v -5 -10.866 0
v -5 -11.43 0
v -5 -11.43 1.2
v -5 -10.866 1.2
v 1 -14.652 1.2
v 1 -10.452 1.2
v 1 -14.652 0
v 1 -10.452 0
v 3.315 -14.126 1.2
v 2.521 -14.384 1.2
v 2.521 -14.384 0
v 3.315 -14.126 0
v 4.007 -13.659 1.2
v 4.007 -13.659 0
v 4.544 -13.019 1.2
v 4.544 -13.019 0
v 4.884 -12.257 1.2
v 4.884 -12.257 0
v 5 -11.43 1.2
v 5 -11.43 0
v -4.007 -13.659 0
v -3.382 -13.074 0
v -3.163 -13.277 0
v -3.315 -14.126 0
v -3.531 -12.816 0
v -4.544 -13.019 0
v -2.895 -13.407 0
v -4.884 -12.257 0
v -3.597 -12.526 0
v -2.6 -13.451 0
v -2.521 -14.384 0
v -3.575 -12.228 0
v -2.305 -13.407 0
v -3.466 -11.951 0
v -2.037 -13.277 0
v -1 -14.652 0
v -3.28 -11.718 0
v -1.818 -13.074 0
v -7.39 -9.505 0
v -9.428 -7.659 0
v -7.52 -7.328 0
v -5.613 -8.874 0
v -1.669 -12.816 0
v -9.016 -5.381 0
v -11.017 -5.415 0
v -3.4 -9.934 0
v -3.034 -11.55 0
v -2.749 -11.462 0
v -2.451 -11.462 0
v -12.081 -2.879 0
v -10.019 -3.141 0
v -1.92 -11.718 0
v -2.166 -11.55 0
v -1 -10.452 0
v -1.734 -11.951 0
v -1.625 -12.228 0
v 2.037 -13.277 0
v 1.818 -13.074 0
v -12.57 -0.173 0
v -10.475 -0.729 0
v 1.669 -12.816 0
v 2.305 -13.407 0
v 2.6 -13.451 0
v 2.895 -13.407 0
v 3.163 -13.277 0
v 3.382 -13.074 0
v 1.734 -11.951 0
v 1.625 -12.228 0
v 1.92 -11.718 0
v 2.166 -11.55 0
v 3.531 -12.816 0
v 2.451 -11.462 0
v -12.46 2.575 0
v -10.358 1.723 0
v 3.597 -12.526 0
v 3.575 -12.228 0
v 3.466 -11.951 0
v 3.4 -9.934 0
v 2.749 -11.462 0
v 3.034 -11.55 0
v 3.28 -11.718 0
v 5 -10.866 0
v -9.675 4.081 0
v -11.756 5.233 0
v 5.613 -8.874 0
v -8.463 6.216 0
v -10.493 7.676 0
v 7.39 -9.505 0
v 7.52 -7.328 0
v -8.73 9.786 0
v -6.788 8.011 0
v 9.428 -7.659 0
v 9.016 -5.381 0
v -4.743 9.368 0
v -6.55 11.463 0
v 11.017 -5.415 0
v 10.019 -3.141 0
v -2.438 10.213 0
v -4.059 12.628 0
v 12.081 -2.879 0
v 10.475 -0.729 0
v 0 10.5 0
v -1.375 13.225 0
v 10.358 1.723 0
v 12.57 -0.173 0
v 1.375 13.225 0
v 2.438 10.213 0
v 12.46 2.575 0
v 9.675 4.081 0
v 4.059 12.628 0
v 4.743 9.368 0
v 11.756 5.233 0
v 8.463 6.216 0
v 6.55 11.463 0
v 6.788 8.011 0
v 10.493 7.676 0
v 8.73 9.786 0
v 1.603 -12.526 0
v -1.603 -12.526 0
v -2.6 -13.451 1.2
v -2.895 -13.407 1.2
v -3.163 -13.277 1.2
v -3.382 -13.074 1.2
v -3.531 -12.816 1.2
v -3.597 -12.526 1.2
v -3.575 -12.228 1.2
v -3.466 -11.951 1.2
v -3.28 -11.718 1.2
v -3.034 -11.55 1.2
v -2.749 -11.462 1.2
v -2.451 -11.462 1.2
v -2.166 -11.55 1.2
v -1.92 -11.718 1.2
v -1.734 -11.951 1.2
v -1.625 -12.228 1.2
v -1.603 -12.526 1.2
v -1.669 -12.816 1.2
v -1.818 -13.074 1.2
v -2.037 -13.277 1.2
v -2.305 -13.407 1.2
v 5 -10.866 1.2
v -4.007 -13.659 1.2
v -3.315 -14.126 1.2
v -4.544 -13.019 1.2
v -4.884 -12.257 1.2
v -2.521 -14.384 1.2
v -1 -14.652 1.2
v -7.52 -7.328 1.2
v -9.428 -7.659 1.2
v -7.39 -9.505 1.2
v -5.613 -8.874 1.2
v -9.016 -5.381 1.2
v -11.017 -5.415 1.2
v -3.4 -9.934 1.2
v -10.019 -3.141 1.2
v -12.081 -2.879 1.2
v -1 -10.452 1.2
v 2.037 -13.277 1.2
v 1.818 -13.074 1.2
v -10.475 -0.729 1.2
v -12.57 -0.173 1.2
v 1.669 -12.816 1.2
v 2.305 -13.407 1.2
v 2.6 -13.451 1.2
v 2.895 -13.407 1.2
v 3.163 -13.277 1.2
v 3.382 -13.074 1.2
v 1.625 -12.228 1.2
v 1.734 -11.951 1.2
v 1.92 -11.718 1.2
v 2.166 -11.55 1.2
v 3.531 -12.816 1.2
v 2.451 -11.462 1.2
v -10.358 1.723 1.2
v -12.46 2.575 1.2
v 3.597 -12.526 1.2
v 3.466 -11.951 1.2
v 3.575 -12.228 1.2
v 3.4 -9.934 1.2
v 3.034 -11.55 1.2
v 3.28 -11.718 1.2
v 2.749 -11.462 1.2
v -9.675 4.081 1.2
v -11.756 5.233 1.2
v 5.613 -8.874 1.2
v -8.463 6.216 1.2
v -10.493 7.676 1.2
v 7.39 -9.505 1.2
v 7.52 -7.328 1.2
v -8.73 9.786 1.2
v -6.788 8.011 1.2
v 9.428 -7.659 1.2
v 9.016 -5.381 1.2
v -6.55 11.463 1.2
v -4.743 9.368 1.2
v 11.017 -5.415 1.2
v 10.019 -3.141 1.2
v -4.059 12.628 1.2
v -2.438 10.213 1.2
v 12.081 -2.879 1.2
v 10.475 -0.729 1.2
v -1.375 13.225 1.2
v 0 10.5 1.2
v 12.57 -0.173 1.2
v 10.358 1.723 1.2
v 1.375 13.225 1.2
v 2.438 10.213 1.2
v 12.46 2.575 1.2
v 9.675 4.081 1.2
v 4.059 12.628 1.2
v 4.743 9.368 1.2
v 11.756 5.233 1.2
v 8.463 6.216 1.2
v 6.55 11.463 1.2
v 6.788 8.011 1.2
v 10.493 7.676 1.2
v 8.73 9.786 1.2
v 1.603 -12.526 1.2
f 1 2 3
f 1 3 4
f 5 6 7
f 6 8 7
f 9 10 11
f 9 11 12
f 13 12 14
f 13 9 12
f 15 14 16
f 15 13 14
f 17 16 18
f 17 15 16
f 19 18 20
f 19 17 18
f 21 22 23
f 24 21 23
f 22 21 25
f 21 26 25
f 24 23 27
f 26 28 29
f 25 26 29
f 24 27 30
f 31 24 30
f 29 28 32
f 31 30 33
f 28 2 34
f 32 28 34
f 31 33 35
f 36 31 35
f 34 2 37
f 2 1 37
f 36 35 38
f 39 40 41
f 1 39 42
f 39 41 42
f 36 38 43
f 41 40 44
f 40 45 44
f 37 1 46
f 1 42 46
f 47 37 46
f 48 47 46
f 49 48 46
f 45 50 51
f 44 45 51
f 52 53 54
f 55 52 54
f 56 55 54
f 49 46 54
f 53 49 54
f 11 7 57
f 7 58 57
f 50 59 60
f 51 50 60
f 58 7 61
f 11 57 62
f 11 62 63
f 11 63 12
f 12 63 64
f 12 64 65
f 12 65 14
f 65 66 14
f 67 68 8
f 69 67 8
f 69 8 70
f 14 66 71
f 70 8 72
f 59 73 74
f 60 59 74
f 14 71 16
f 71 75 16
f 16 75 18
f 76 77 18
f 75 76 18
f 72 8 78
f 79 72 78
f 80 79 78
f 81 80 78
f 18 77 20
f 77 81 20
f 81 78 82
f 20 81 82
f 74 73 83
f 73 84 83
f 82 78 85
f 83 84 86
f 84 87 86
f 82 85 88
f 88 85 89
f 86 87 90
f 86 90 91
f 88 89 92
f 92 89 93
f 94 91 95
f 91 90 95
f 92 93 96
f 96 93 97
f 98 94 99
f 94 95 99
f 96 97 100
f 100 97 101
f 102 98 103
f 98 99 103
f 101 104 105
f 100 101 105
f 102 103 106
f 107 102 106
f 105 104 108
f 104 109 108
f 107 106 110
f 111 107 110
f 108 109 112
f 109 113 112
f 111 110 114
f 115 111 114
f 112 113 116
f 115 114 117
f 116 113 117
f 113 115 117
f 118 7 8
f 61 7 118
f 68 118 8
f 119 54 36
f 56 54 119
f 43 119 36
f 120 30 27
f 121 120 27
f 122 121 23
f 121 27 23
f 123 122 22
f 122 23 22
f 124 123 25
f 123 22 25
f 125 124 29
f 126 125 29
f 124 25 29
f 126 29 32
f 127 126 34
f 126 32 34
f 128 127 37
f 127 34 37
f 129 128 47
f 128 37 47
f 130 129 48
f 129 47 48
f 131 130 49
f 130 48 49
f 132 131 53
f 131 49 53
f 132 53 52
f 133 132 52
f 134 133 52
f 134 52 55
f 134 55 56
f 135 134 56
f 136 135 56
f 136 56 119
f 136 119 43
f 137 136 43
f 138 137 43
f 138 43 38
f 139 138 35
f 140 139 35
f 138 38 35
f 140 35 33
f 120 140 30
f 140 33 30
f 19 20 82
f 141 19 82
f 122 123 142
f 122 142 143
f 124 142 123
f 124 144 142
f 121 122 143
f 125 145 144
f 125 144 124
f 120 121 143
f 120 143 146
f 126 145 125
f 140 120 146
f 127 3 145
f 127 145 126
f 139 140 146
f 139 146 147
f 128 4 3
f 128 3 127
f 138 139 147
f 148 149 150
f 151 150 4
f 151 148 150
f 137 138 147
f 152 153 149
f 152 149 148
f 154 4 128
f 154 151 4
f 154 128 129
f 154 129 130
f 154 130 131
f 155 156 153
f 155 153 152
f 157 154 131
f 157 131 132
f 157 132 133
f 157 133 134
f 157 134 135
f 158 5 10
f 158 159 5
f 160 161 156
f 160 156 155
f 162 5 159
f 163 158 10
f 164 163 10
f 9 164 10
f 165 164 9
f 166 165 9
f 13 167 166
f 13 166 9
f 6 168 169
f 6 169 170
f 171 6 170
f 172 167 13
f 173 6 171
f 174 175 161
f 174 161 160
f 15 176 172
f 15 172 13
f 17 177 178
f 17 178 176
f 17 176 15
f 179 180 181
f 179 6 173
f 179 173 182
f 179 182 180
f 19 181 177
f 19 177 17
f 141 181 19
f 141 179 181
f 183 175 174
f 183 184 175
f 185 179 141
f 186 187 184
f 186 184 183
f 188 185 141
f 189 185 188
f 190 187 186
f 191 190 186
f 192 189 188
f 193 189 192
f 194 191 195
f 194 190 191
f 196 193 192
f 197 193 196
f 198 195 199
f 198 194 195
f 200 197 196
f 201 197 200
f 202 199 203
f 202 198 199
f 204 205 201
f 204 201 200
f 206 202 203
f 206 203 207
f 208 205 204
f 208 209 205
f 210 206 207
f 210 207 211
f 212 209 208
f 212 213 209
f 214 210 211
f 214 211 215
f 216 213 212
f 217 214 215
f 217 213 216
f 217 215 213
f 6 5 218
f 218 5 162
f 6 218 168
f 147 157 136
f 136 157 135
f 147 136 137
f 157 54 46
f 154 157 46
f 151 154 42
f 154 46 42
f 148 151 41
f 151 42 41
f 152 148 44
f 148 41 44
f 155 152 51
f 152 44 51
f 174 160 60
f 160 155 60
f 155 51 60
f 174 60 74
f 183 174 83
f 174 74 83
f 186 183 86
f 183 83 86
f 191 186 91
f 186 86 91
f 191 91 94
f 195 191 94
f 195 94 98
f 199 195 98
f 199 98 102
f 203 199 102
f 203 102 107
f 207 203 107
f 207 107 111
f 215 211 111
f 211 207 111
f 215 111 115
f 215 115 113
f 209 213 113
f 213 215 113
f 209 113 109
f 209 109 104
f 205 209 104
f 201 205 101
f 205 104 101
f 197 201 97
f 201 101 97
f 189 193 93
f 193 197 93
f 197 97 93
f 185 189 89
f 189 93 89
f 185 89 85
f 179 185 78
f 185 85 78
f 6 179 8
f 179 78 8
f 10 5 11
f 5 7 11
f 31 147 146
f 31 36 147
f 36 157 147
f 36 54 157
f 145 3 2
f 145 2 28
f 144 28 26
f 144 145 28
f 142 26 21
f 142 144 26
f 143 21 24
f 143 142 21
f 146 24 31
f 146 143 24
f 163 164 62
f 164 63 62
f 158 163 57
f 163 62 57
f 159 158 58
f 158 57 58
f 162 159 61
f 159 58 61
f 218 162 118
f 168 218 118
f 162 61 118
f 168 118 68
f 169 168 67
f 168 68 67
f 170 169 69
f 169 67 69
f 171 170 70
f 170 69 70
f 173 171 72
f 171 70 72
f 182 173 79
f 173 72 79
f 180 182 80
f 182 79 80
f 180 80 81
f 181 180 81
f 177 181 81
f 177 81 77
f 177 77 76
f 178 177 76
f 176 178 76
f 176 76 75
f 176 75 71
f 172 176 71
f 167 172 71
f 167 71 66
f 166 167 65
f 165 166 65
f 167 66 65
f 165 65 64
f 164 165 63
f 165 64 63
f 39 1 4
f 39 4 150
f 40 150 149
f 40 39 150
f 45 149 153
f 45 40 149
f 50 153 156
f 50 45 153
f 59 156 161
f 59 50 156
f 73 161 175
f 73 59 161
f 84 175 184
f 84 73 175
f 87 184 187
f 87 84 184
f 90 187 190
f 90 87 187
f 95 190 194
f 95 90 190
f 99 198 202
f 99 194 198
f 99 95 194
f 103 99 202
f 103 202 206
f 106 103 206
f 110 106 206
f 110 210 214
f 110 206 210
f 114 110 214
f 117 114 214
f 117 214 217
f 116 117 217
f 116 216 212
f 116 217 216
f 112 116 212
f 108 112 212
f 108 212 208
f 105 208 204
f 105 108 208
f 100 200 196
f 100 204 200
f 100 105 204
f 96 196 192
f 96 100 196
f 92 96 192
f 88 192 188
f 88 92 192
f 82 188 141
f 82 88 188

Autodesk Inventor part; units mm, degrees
ref_plane "WorkPlane1" through (0, 0, 0) normal (0, 0, 1) x (1, 0, 0)
ref_plane "Work Plane2" through (0, 0, -1.2) normal (0, 0, 1) x (1, 0, 0)
ref_plane "WorkPlane2" through (0, 0, 1.5) normal (0, 0, 1) x (1, 0, 0)
sketch "Boceto1" plane through (0, 0, 0) normal (0, 0, 1) x (1, 0, 0)
  point P0 (0, 0)
sketch "Boceto2" plane through (0, 0, 0) normal (0, 0, 1) x (1, 0, 0)
  line L0 (5, -13.947) -> (5, -10.8655)
  line L1 (1, -14.6523) -> (5, -13.947)
  line L2 (1, -10.4523) -> (1, -14.6523)
  arc A0 (1, -10.4523) -> (-1, -10.4523) centre (0, 0) ccw
  line L3 (-1, -10.4523) -> (-1, -14.6523)
  line L4 (-1, -14.6523) -> (-5, -13.947)
  line L5 (-5, -13.947) -> (-5, -10.8655)
  arc A1 (5, -10.8655) -> (-5, -10.8655) centre (0, 0.7) ccw
  dimension "d2" = 10.5
  dimension "d4" = 12.6
  dimension "d6" = 0
  dimension "d8" = 1
  dimension "d10" = 1
  dimension "d12" = 4.2
  dimension "d14" = 4.2
  dimension "d16" = 80
  dimension "d18" = 80
  dimension "d20" = 4
  dimension "d22" = 4
  dimension "d24" = 0.7
  dimension "d52" = 0
  dimension "d53" = 0
extrude "Extrusión1" add sketch "Boceto2" along normal blind 1.2
sketch "Boceto3" plane through (0, 0, 1.2) normal (0, 0, 1) x (1, 0, 0)
  line L0 (-1, -10.4523) -> (-1, -14.6523) projected
  line L1 (-1, -14.6523) -> (-5, -13.947) projected
  point P0 (-2.6, -12.451)
  dimension "d30" = 1.6
  dimension "d32" = 1.89
hole "Agujero1" at (-2.6, -12.451, 1.2) direction (0, 0, -1) diameter 2 end through all
sketch "Boceto4" plane through (0, 0, 1.2) normal (0, 0, 1) x (1, 0, 0)
  line L0 (1, -14.6523) -> (1, -10.4523) projected
  line L1 (5, -13.947) -> (1, -14.6523) projected
  point P0 (2.6, -12.451)
  dimension "d41" = 1.6
  dimension "d43" = 1.89
hole "Agujero2" at (2.6, -12.451, 1.2) direction (0, 0, -1) diameter 2 end through all
fillet "Empalme1" radius 3 2 edges at (-5, -13.947, 0.6) (5, -13.947, 0.6)
equation "\"d2\" = 0.5 * Diam2"
equation "\"d4\" = 0.166667 * ParA + 0.5 * Diam2 + 0.5 * b"
equation "\"d8\" = 0.5 * Diam5"
equation "\"d10\" = 0.5 * Diam5"
equation "\"d12\" = ParA"
equation "\"d14\" = ParA"
equation "\"d20\" = 2 * Diam5"
equation "\"d22\" = 2 * Diam5"
equation "\"d24\" = -msp_r2 + 0.5 * Diam2 + b"
equation "\"d25\" = ParS"
equation "\"d30\" = 0.8 * Diam5"
equation "\"d32\" = 0.45 * ParA"
equation "\"d33\" = Diam5"
equation "\"d41\" = 0.8 * Diam5"
equation "\"d43\" = 0.45 * ParA"
equation "\"d44\" = Diam5"
equation "\"d51\" = 1.5 * Diam5"
equation "\"Diam5\" = 2"
equation "\"ParA\" = 4.2"
equation "\"ParS\" = 1.2"
equation "\"Diam2\" = 21"
equation "\"msp_r2\" = 0.166667 * ParA + 0.5 * Diam2 + 0.5 * b"
equation "\"TEMPLATE\" = 1.2345"
properties part number "DIN 471 - 22x1,2" material "Acero, suave"
